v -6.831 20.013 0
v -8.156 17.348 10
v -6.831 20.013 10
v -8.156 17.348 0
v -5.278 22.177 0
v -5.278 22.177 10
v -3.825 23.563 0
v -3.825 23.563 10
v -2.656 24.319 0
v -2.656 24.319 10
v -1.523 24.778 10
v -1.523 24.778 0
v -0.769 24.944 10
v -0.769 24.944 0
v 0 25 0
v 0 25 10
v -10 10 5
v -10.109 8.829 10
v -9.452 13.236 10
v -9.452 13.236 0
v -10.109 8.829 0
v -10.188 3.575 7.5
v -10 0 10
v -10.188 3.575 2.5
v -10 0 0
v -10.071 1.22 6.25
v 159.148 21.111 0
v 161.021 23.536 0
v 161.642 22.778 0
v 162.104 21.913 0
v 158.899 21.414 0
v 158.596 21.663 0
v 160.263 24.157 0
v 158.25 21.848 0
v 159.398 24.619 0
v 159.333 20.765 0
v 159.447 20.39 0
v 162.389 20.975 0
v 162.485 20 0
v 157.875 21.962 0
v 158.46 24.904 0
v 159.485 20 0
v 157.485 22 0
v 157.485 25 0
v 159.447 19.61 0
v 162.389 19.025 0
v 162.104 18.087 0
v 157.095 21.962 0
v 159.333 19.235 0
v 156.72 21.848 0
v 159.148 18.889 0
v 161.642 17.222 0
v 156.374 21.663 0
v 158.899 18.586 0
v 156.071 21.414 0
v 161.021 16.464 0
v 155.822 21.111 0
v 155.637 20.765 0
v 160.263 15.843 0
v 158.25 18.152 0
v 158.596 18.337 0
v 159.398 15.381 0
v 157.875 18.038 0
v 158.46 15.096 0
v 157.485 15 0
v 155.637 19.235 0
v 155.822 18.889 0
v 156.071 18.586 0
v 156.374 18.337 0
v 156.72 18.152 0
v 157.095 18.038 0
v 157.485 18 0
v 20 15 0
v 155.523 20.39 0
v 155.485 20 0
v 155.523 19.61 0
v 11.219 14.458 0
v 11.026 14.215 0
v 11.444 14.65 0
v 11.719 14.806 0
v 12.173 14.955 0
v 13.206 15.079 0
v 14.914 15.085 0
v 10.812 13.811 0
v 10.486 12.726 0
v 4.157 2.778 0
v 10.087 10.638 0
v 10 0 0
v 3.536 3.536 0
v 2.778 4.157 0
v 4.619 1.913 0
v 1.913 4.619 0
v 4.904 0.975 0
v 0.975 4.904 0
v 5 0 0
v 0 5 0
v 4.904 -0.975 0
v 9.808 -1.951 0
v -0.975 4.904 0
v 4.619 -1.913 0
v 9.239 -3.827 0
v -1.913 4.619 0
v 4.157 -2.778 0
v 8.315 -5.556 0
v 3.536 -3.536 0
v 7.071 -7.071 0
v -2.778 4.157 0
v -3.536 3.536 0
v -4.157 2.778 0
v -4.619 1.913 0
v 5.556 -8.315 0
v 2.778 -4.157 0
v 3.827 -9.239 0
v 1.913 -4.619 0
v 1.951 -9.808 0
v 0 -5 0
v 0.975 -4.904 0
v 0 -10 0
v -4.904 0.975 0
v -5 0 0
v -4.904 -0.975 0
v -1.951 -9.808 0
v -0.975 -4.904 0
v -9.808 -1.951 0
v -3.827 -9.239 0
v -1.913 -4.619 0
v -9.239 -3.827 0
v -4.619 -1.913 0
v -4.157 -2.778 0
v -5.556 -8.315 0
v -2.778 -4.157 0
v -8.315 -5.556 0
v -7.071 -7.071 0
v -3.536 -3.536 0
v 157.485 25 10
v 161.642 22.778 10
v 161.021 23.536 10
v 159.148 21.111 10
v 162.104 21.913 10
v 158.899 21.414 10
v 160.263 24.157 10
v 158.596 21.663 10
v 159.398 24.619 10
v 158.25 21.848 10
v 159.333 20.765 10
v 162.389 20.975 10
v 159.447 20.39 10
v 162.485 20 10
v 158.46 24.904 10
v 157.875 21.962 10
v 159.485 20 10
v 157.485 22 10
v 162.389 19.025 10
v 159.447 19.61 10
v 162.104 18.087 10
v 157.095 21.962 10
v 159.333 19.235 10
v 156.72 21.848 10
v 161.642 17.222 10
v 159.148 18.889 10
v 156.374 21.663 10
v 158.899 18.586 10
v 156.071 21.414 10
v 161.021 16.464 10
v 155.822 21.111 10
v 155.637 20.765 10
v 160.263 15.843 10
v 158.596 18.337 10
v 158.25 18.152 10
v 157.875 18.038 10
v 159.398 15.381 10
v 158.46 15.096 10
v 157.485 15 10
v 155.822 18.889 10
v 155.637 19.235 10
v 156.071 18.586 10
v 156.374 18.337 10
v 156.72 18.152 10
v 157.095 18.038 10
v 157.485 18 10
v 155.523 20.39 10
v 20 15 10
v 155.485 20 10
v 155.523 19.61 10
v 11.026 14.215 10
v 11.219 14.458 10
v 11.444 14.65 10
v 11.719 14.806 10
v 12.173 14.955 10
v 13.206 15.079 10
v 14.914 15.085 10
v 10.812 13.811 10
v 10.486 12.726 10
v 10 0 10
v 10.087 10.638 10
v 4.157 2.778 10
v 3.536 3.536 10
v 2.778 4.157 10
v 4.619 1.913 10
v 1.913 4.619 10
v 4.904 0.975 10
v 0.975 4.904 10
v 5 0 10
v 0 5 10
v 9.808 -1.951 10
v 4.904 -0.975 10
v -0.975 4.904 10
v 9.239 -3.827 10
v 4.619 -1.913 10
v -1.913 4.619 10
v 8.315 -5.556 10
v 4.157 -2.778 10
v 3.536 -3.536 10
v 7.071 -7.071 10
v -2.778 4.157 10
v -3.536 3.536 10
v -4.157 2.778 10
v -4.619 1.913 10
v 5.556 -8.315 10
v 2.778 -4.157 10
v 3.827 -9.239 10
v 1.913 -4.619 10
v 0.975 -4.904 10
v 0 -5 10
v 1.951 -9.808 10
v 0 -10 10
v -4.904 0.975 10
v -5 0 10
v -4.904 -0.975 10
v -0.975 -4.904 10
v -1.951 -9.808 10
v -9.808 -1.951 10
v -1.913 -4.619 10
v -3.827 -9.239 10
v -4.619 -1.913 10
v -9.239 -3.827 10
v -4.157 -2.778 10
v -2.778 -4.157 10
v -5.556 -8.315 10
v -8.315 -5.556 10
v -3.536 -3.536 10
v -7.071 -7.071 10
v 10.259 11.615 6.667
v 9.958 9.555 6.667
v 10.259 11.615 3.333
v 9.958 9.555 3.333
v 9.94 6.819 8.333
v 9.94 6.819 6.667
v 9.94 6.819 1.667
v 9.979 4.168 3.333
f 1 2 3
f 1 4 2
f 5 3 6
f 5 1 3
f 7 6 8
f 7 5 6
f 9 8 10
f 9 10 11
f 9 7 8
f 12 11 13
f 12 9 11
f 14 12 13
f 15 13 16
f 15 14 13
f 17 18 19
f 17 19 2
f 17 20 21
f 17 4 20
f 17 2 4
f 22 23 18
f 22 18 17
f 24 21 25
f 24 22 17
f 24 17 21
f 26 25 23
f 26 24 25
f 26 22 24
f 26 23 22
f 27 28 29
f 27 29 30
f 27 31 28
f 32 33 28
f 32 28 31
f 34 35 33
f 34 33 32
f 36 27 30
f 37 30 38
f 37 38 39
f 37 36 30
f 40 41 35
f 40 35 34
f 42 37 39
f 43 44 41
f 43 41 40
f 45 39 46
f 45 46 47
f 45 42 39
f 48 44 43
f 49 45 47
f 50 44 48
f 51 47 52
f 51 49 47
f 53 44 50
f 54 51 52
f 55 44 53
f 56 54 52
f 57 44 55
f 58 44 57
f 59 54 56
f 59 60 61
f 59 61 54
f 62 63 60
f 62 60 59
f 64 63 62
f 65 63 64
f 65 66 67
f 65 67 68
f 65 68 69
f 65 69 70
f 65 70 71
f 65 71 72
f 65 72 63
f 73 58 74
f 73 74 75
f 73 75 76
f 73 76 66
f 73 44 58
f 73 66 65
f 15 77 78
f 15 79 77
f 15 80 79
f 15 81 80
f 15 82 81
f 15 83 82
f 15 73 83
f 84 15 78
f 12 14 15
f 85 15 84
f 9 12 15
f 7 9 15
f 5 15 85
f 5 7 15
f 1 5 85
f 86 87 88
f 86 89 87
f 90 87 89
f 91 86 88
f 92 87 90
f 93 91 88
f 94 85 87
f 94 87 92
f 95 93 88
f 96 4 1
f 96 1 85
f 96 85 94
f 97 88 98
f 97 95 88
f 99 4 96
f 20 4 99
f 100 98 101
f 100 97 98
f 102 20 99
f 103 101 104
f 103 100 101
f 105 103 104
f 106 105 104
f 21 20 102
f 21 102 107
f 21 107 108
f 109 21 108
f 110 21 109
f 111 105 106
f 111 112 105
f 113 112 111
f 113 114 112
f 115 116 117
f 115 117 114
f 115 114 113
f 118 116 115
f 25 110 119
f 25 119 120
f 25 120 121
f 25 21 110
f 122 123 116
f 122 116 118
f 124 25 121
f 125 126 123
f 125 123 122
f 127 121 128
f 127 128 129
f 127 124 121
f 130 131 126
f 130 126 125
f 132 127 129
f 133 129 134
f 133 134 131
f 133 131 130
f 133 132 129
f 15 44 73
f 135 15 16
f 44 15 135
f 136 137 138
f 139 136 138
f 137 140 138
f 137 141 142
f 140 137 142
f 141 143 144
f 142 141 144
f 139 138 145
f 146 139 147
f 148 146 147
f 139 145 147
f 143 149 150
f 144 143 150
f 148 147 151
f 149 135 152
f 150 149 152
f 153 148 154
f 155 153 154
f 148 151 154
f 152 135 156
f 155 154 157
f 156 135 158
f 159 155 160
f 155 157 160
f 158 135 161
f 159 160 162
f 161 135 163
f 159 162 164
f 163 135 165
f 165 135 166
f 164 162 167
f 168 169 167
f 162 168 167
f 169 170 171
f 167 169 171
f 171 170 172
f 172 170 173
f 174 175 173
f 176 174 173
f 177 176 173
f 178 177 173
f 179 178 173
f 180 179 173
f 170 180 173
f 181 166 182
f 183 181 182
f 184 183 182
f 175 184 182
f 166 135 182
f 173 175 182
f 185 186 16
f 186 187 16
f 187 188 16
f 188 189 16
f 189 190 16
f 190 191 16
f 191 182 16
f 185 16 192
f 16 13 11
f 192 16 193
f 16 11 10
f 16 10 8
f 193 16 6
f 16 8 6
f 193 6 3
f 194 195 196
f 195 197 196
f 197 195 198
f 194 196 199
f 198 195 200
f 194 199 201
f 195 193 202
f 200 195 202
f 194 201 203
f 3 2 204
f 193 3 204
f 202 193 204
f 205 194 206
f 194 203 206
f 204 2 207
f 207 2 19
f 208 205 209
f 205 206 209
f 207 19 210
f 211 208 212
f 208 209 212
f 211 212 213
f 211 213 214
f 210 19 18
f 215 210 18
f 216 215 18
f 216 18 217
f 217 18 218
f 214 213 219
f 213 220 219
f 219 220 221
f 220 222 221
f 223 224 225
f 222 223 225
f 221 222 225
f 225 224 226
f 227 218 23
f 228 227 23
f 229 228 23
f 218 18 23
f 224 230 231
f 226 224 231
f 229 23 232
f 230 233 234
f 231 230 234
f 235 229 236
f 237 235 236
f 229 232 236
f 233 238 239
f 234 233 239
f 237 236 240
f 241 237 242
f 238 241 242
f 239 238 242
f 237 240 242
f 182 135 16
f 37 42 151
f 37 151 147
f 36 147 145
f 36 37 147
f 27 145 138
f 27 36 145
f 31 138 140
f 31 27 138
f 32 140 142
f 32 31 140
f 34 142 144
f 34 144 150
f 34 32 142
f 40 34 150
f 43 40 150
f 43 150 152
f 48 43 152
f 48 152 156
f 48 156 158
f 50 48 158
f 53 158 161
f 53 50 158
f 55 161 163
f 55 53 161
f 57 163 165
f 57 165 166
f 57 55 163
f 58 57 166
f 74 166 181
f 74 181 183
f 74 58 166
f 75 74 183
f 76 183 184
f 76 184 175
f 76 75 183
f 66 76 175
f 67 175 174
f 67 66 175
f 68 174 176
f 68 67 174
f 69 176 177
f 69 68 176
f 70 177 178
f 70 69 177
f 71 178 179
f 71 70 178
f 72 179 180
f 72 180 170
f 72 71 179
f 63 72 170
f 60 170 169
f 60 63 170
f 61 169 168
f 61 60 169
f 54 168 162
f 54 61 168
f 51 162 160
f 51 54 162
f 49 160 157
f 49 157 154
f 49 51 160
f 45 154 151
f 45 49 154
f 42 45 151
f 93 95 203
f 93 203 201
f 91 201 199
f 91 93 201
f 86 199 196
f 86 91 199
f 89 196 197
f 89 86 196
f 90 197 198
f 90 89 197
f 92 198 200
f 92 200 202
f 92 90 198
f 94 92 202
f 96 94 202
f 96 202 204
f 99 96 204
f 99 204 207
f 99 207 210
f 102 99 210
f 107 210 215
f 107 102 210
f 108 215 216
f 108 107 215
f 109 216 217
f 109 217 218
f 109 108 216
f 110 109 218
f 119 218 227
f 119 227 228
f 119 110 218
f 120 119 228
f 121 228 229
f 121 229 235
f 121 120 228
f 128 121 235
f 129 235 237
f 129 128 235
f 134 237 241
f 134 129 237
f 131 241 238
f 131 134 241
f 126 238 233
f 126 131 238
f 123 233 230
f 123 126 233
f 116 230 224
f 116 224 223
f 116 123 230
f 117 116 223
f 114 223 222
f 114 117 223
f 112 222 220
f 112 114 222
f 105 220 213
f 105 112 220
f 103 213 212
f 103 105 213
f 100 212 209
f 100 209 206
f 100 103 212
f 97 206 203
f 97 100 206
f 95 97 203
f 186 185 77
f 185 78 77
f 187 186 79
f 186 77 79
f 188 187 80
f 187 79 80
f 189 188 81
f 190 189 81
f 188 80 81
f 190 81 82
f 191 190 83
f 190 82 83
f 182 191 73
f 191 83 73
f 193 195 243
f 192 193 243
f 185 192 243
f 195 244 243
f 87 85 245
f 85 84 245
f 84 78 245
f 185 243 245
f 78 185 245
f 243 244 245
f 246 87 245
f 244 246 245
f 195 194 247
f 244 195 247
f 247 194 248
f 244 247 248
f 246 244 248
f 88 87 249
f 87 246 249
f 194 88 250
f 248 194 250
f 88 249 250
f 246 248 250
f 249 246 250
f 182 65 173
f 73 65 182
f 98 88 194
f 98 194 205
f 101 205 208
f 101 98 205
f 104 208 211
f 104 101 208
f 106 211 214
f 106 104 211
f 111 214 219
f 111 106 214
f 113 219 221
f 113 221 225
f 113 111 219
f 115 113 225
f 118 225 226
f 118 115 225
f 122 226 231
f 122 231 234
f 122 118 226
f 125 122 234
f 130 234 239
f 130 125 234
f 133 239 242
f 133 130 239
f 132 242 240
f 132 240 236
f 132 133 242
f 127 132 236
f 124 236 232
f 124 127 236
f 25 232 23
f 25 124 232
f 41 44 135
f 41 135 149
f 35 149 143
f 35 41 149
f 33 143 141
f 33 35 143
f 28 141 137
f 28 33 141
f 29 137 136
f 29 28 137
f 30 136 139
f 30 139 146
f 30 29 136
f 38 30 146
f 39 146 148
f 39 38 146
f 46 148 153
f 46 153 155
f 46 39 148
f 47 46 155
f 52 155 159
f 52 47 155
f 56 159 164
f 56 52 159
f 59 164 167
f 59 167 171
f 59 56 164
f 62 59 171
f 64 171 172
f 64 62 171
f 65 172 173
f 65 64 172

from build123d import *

# Parameters (mm, degrees)
SKETCH1_R           = 2
SKETCH1_R_2         = 5
BOSS_EXTRUDE1_DEPTH = 10


with BuildPart() as part:
    # Sketch1 → Boss-Extrude1 (new body)
    with BuildSketch(Plane(origin=(0, 0, 0), x_dir=(0, 1, 0), z_dir=(0, 0, 1))):
        with BuildLine():
            Line((25, 0), (25, -157.485))
            ThreePointArc((25, -157.485), (20, -162.485), (15, -157.485))
            Line((15, -157.485), (15, -20))
            add(Edge.make_bspline(
                [(0, -10), (6.790237035, -10), (8.986605454, -9.776088448), (16.124815875, -11.074928382), (15, -11.199503027), (15, -20)],
                knots=[0, 0, 0, 0, 0.182751564, 0.282751564, 1, 1, 1, 1], degree=3))
            ThreePointArc((0, -10), (-10, 0), (0, 10))
            add(Edge.make_bspline(
                [(0, 10), (0.681079819, 10), (14.239709664, 11.405780044), (25, 4.931387971), (25, 0)],
                knots=[0, 0, 0, 0, 0.356789172, 1, 1, 1, 1], degree=3))
        make_face()
        with Locations(Location((20, -157.485, 0), (0, 0, 270))):
            Circle(SKETCH1_R, mode=Mode.SUBTRACT)
        with Locations(Location((0, 0, 0), (0, 0, 270))):
            Circle(SKETCH1_R_2, mode=Mode.SUBTRACT)
    extrude(amount=BOSS_EXTRUDE1_DEPTH)


solid = part.part
